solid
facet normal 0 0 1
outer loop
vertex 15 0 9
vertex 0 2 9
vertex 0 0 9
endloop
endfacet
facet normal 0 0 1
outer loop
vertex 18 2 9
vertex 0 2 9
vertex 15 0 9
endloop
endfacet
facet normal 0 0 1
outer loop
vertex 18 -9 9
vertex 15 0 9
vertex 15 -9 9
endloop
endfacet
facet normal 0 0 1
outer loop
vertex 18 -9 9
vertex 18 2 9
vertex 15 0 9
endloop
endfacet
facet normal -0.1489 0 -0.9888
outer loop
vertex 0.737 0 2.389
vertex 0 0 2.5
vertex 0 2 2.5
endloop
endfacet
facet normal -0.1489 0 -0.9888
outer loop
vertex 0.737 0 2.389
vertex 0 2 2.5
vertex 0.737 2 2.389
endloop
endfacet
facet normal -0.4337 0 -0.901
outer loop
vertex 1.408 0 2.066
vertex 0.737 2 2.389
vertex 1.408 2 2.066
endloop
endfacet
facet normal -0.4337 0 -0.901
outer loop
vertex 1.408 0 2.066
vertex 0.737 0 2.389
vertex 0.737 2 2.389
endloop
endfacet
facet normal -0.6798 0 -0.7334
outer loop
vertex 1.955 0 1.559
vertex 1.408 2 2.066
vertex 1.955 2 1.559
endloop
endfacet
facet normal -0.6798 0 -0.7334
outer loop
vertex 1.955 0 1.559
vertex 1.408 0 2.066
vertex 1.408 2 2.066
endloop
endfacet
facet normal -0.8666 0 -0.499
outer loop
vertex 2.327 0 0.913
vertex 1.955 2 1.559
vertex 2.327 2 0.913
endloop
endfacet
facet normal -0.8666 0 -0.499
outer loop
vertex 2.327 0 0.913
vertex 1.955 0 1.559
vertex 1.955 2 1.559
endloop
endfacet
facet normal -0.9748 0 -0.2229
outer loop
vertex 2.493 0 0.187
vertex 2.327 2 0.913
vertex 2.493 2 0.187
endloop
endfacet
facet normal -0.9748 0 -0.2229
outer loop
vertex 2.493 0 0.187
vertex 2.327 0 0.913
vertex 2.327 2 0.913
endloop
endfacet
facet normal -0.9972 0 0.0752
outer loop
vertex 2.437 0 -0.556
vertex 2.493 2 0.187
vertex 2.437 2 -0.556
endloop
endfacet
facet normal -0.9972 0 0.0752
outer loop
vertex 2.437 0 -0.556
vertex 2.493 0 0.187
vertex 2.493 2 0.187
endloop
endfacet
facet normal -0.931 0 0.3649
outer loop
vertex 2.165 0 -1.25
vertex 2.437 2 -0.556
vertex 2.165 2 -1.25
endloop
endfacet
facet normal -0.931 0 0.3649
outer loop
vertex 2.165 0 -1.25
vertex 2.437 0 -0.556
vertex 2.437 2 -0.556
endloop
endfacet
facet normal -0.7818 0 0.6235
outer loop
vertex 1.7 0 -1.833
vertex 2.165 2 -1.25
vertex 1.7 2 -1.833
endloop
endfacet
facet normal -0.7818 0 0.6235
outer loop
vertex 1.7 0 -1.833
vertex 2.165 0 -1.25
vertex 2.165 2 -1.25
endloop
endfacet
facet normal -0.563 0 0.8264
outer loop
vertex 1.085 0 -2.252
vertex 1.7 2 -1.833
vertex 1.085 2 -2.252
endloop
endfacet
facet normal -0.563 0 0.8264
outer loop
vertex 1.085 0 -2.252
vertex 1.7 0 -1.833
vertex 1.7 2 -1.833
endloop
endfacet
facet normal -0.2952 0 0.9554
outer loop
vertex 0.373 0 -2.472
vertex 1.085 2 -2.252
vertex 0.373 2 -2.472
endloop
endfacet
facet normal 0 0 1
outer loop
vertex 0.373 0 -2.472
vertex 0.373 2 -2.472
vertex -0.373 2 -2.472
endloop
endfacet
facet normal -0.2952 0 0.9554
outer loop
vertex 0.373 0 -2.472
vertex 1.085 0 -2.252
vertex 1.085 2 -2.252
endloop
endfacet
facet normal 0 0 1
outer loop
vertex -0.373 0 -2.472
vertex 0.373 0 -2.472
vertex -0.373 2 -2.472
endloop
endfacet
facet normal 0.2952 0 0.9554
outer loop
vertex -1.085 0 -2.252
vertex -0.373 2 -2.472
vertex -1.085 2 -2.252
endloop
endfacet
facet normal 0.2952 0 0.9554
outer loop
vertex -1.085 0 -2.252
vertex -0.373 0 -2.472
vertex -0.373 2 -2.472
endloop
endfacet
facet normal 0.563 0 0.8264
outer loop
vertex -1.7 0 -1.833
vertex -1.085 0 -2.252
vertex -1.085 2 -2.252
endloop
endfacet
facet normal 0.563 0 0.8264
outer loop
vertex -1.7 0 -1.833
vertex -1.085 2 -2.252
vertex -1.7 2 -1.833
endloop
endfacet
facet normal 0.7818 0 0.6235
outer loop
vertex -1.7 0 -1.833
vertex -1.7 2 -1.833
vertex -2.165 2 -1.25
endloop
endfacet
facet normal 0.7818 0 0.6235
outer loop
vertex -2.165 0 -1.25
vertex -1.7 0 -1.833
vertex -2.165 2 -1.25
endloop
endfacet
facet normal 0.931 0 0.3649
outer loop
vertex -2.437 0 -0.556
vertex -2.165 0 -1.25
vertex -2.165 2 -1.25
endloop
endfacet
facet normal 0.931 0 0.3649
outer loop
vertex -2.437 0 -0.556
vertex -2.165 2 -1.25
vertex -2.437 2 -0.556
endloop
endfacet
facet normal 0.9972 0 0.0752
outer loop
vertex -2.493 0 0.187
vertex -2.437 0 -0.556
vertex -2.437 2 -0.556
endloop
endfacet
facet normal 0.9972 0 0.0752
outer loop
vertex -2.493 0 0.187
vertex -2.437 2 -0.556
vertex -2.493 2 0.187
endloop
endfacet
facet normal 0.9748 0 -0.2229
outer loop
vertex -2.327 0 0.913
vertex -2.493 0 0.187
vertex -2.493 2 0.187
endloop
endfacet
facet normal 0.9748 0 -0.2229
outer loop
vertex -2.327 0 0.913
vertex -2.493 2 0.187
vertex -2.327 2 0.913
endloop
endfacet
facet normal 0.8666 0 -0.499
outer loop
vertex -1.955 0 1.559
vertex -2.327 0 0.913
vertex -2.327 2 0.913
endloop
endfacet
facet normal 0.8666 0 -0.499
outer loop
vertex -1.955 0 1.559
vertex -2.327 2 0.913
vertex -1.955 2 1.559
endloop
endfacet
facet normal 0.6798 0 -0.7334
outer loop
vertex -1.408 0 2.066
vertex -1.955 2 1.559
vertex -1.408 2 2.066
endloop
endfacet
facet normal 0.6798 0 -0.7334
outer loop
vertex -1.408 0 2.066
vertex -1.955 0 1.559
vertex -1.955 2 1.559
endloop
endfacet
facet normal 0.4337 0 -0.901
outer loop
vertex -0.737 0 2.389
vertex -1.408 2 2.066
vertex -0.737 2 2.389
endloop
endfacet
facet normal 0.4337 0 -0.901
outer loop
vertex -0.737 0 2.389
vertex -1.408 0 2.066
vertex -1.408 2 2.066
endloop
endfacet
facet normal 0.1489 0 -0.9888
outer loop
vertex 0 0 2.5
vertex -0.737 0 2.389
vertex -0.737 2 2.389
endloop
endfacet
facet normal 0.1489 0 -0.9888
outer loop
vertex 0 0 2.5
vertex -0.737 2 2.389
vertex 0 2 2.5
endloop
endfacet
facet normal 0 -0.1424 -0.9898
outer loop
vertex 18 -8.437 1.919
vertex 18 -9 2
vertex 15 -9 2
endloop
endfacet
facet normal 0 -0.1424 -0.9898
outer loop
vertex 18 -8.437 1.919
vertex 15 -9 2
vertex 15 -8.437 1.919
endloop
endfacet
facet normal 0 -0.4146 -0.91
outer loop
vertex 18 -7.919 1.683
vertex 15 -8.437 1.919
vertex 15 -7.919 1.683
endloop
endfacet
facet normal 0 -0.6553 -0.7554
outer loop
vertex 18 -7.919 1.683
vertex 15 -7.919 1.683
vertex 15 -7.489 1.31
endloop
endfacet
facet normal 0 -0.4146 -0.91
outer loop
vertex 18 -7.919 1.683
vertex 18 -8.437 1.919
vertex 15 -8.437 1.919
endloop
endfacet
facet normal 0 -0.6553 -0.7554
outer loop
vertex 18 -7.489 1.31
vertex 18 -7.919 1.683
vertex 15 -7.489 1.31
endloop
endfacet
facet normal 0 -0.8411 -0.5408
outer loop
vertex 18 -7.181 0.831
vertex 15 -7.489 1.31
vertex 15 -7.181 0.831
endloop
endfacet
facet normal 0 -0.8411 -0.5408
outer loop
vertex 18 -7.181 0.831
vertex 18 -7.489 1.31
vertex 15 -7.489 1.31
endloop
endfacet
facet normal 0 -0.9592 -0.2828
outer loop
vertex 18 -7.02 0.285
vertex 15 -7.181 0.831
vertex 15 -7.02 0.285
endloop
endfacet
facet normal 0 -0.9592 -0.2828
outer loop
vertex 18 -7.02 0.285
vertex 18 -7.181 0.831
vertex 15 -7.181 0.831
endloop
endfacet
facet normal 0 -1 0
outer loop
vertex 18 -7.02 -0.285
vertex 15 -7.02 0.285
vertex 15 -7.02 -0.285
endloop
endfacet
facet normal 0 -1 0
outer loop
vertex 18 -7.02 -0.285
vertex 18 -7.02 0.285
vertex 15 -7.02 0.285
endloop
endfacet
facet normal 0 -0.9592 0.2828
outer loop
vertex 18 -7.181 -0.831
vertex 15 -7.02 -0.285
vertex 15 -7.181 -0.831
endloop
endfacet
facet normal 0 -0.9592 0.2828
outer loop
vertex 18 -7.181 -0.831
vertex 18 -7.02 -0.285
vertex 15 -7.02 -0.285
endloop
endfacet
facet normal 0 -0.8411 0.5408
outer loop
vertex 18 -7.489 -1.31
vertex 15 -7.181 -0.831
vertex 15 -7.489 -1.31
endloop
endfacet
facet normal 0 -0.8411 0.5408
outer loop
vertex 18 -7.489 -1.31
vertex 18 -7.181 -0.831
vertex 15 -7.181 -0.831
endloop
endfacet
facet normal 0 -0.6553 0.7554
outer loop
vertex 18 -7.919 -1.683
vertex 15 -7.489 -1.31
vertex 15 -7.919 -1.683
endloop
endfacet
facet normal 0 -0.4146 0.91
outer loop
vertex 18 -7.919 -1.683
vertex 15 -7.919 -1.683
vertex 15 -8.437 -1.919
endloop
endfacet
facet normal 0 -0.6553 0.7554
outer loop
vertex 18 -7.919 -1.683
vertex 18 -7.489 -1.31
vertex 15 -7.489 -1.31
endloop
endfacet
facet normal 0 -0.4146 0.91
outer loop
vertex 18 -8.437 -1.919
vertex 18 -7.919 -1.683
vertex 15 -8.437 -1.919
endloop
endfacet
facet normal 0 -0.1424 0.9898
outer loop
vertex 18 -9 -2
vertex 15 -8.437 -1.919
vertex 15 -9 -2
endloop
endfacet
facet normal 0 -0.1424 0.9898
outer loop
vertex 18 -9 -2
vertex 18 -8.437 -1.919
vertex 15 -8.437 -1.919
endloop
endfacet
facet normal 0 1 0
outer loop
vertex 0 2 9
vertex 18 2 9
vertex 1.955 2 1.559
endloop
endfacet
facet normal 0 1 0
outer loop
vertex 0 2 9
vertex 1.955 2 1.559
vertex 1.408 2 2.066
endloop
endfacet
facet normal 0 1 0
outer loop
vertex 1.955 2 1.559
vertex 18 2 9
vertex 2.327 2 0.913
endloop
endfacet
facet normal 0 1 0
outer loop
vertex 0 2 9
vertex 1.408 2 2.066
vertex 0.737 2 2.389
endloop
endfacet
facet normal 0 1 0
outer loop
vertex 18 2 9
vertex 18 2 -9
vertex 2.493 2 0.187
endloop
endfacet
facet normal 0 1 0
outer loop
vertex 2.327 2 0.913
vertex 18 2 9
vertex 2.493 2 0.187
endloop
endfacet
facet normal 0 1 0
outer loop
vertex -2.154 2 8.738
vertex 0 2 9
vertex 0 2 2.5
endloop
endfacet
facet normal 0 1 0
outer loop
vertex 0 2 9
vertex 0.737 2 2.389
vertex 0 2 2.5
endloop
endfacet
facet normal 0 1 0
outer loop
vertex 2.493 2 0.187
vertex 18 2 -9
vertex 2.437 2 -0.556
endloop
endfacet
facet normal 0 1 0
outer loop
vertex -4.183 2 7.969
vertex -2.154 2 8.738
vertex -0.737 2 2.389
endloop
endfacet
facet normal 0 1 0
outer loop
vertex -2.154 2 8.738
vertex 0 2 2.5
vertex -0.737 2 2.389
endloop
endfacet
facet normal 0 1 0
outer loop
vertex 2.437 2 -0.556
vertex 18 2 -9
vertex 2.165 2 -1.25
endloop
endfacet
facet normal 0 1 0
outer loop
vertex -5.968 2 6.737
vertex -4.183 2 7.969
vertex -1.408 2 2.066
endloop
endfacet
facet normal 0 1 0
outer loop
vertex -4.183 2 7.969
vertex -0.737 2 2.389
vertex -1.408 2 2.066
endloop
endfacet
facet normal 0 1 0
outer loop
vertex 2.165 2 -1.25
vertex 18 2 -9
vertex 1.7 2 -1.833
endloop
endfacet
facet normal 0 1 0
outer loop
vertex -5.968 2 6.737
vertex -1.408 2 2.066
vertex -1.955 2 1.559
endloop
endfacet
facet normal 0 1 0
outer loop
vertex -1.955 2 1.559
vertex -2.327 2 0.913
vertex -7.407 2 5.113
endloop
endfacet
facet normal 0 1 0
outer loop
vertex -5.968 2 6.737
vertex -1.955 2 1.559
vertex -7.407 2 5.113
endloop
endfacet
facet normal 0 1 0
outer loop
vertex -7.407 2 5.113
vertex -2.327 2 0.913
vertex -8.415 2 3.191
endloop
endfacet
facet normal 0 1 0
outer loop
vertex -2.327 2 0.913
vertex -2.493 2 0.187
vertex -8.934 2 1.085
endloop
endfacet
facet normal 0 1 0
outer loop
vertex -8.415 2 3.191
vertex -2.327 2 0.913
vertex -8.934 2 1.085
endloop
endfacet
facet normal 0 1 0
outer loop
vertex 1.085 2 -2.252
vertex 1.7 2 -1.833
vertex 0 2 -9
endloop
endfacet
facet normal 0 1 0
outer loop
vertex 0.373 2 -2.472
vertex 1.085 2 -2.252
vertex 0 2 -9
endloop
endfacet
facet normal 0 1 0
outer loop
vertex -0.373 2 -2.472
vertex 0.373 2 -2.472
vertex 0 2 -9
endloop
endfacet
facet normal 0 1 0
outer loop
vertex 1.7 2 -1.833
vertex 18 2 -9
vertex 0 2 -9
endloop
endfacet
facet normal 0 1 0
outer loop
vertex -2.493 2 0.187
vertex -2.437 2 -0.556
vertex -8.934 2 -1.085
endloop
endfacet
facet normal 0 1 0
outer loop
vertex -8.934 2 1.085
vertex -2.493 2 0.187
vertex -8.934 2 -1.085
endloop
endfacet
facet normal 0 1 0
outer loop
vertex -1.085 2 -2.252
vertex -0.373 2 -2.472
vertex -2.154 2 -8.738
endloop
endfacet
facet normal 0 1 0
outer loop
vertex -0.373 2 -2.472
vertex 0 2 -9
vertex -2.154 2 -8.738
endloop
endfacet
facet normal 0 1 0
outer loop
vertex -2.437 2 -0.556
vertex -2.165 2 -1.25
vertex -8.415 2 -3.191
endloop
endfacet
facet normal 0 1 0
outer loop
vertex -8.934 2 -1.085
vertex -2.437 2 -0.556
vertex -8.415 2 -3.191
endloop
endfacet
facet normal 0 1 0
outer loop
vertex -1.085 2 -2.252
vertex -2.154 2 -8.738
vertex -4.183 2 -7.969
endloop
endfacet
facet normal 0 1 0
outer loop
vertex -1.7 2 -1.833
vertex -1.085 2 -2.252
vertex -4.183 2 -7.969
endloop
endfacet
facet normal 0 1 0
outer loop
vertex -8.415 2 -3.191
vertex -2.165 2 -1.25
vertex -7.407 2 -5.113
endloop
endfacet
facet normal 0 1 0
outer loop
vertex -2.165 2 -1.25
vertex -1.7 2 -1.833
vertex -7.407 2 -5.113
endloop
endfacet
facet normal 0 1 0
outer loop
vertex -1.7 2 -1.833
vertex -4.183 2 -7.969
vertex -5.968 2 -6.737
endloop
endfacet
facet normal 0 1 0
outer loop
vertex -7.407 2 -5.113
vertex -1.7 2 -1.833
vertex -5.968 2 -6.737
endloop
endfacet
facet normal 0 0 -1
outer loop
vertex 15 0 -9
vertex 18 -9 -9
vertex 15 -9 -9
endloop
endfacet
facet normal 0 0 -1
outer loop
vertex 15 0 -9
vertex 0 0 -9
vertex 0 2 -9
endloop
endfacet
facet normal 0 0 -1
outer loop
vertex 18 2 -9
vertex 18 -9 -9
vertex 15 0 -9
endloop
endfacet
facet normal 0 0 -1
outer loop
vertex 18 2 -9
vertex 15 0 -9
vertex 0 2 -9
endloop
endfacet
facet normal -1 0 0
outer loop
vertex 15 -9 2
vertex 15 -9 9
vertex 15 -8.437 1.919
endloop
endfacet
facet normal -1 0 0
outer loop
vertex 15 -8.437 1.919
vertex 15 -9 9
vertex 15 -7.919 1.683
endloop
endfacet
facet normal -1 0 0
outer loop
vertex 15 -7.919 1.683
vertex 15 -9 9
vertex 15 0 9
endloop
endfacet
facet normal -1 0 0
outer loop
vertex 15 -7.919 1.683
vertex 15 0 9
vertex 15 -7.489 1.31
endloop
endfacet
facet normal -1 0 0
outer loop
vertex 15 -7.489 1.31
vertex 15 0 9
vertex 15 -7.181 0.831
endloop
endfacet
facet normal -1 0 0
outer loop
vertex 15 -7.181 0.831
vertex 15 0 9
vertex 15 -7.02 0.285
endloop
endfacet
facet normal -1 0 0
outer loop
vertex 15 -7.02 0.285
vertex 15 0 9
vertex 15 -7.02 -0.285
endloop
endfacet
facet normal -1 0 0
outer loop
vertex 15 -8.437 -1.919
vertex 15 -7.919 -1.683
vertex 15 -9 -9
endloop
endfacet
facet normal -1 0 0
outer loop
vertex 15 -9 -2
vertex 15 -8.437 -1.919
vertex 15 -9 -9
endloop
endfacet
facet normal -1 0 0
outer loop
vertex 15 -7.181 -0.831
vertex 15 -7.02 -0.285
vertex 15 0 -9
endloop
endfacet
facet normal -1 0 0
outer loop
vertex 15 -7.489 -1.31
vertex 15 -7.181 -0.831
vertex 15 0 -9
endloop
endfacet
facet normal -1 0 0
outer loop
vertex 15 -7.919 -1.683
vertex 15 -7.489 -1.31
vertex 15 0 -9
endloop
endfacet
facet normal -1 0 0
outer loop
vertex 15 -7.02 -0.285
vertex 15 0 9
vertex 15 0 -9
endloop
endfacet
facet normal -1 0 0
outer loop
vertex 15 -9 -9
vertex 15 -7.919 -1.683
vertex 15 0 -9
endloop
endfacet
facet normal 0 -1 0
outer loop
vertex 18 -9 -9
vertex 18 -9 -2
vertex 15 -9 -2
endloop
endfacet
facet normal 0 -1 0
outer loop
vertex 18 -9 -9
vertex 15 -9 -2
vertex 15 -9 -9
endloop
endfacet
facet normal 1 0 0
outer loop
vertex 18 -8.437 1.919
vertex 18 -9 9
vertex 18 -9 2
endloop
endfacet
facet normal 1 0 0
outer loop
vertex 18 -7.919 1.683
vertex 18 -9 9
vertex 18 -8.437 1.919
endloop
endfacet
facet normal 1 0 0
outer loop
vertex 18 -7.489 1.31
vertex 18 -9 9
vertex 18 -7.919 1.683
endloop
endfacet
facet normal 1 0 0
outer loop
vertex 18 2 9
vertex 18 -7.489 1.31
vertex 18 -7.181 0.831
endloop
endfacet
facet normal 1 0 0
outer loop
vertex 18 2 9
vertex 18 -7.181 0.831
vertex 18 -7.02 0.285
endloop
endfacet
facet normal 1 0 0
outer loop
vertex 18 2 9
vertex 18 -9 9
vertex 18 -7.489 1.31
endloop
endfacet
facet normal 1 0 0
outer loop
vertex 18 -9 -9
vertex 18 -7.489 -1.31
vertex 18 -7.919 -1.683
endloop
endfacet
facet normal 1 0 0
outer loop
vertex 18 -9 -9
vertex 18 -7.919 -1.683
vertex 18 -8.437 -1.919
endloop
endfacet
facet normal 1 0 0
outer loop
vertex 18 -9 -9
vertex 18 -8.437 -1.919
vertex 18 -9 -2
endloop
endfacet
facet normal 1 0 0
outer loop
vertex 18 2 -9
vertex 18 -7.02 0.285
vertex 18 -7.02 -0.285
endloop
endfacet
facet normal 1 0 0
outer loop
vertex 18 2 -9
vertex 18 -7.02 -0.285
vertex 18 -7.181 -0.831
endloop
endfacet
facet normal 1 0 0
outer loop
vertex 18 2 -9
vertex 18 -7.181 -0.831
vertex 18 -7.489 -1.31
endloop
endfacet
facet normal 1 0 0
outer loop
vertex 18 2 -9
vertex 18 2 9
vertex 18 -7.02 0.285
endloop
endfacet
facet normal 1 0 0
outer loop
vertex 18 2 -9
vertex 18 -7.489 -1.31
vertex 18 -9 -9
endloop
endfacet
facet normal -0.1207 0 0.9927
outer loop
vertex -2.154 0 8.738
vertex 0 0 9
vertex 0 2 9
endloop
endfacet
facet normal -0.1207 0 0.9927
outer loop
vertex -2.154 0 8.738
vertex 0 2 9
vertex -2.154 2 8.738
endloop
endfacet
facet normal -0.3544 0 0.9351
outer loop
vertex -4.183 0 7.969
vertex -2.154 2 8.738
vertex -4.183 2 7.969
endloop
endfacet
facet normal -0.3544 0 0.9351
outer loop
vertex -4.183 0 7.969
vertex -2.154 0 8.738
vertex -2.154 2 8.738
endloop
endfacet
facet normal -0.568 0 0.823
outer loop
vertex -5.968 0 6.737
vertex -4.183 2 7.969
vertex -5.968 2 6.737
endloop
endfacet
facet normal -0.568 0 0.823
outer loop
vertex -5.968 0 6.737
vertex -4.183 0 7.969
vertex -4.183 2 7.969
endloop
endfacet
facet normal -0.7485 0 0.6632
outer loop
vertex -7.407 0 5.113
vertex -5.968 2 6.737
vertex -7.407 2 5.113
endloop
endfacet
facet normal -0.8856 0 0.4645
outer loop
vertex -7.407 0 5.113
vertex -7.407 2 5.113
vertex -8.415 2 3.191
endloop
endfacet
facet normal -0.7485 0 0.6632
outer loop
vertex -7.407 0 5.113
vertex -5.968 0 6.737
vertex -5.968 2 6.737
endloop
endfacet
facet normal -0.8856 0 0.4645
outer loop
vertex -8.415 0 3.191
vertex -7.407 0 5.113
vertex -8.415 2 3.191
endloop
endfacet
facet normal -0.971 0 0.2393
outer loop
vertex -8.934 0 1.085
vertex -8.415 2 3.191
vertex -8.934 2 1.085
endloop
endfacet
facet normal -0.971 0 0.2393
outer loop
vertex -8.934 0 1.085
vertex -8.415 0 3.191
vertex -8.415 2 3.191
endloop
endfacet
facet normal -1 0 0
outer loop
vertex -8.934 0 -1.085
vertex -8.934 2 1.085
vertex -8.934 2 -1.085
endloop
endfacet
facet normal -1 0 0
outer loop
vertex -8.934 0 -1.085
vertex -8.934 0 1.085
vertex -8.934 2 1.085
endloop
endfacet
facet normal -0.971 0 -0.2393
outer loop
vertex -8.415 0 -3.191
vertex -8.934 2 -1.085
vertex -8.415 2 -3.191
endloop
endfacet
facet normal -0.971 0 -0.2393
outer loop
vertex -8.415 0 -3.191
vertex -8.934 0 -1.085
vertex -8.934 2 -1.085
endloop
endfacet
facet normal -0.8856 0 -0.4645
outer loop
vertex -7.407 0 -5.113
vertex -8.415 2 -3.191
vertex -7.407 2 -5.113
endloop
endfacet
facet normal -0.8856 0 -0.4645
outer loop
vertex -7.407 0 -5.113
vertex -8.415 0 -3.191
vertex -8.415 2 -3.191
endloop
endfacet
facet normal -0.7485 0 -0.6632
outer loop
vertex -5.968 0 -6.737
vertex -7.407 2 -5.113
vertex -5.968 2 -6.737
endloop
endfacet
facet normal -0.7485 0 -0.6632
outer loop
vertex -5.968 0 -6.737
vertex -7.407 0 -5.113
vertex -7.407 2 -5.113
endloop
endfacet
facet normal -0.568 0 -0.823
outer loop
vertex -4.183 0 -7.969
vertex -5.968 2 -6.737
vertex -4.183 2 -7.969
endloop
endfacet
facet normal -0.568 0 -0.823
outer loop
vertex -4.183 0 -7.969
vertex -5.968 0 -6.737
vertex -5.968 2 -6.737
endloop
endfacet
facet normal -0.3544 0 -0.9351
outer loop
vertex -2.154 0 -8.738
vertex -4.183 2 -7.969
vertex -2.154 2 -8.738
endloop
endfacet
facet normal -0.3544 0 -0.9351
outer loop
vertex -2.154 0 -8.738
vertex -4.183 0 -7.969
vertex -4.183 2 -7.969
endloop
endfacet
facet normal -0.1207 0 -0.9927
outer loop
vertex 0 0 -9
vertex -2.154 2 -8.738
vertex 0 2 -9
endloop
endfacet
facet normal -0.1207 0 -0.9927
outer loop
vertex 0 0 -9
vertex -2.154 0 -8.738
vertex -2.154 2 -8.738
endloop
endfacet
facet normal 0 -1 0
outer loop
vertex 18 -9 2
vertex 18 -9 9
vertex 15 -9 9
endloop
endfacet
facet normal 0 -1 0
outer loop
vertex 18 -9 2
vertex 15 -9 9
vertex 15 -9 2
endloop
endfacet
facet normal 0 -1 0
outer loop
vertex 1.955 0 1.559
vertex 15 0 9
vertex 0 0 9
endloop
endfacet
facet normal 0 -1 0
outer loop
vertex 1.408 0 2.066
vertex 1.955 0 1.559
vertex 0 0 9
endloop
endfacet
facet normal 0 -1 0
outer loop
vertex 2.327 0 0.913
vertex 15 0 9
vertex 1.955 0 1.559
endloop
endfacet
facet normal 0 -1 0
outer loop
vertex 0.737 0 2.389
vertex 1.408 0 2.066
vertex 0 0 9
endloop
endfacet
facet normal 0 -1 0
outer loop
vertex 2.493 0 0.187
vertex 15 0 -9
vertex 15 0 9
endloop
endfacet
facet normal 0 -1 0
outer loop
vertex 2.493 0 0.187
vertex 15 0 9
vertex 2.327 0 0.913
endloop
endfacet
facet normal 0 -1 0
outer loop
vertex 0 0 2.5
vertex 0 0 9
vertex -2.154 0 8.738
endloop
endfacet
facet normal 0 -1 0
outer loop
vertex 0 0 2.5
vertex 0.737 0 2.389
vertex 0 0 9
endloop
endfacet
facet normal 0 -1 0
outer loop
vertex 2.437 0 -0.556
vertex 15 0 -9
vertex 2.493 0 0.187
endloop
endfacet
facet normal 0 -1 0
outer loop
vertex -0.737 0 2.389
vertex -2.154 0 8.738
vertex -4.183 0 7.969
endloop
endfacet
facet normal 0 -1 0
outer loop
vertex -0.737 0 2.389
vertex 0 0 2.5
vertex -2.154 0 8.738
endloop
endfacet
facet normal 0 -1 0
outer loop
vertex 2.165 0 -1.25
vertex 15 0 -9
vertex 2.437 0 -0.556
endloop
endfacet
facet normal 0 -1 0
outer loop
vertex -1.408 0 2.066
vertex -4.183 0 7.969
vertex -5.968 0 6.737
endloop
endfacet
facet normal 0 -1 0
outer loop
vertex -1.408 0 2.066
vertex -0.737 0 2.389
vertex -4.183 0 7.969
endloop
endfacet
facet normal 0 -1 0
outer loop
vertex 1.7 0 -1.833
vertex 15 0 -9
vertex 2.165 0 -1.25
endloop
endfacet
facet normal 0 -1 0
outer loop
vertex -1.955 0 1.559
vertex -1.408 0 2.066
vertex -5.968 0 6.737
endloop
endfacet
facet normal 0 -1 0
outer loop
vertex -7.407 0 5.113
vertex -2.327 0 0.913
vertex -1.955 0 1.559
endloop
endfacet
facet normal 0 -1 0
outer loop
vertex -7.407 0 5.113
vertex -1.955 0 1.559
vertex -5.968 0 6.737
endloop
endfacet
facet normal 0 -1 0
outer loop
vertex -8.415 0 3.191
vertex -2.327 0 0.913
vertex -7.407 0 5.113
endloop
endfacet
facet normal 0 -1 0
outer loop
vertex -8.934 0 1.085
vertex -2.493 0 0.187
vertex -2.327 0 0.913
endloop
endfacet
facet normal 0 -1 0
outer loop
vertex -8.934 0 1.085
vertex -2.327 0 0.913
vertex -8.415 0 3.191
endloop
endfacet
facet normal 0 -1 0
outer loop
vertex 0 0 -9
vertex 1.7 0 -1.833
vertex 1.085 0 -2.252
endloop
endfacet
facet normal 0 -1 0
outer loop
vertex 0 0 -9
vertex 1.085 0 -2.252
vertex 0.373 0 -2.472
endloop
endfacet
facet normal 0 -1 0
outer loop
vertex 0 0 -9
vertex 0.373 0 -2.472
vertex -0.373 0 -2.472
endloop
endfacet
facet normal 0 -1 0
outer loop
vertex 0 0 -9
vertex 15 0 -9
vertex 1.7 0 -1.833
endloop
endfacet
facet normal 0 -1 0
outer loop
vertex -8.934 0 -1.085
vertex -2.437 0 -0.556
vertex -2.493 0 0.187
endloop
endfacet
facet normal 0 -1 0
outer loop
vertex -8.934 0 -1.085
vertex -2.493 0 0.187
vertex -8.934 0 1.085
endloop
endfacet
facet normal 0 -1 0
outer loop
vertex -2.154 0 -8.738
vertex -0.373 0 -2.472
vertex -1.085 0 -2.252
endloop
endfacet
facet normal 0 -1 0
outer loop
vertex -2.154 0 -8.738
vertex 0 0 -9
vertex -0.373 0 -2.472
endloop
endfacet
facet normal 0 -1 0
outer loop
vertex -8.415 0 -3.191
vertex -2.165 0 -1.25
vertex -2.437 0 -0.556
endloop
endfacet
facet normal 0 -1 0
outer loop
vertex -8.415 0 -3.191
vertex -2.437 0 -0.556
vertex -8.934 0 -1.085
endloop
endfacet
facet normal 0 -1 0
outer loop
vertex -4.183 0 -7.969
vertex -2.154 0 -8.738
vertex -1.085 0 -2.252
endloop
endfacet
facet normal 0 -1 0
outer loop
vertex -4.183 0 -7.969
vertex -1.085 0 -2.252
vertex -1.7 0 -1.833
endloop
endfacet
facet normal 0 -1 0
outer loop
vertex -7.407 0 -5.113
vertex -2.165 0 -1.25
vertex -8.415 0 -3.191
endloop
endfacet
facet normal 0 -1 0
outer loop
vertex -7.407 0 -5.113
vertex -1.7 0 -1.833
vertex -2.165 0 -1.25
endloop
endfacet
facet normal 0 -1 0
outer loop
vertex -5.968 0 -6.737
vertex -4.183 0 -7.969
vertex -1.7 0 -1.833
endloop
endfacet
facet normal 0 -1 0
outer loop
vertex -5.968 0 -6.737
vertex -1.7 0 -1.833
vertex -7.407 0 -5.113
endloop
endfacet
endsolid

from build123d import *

# Parameters (mm, degrees)
SKETCH1_R           = 2.5
BOSS_EXTRUDE1_DEPTH = 2
BOSS_EXTRUDE2_DEPTH = 3


with BuildPart() as part:
    # Sketch1 → Boss-Extrude1 (new body)
    with BuildSketch(Plane(origin=(0, 0, 0), x_dir=(1, 0, 0), z_dir=(0, 1, 0))):
        with BuildLine():
            Line((0, 9), (18, 9))
            Line((18, 9), (18, -9))
            Line((18, -9), (0, -9))
            ThreePointArc((0, -9), (-9, 0), (0, 9))
        make_face()
        with Locations(Location((0, 0, 0), (0, 0, 270))):
            Circle(SKETCH1_R, mode=Mode.SUBTRACT)
    extrude(amount=BOSS_EXTRUDE1_DEPTH)

    # Sketch2 → Boss-Extrude2 (add)
    with BuildSketch(Plane(origin=(18, 0, 0), x_dir=(0, 0, -1), z_dir=(1, 0, 0))):
        with BuildLine():
            Line((9, 0), (-9, 0))
            Line((-9, 0), (-9, -9))
            Line((-9, -9), (-2, -9))
            ThreePointArc((-2, -9), (0, -7), (2, -9))
            Line((2, -9), (9, -9))
            Line((9, -9), (9, 0))
        make_face()
    extrude(amount=-BOSS_EXTRUDE2_DEPTH)


solid = part.part
